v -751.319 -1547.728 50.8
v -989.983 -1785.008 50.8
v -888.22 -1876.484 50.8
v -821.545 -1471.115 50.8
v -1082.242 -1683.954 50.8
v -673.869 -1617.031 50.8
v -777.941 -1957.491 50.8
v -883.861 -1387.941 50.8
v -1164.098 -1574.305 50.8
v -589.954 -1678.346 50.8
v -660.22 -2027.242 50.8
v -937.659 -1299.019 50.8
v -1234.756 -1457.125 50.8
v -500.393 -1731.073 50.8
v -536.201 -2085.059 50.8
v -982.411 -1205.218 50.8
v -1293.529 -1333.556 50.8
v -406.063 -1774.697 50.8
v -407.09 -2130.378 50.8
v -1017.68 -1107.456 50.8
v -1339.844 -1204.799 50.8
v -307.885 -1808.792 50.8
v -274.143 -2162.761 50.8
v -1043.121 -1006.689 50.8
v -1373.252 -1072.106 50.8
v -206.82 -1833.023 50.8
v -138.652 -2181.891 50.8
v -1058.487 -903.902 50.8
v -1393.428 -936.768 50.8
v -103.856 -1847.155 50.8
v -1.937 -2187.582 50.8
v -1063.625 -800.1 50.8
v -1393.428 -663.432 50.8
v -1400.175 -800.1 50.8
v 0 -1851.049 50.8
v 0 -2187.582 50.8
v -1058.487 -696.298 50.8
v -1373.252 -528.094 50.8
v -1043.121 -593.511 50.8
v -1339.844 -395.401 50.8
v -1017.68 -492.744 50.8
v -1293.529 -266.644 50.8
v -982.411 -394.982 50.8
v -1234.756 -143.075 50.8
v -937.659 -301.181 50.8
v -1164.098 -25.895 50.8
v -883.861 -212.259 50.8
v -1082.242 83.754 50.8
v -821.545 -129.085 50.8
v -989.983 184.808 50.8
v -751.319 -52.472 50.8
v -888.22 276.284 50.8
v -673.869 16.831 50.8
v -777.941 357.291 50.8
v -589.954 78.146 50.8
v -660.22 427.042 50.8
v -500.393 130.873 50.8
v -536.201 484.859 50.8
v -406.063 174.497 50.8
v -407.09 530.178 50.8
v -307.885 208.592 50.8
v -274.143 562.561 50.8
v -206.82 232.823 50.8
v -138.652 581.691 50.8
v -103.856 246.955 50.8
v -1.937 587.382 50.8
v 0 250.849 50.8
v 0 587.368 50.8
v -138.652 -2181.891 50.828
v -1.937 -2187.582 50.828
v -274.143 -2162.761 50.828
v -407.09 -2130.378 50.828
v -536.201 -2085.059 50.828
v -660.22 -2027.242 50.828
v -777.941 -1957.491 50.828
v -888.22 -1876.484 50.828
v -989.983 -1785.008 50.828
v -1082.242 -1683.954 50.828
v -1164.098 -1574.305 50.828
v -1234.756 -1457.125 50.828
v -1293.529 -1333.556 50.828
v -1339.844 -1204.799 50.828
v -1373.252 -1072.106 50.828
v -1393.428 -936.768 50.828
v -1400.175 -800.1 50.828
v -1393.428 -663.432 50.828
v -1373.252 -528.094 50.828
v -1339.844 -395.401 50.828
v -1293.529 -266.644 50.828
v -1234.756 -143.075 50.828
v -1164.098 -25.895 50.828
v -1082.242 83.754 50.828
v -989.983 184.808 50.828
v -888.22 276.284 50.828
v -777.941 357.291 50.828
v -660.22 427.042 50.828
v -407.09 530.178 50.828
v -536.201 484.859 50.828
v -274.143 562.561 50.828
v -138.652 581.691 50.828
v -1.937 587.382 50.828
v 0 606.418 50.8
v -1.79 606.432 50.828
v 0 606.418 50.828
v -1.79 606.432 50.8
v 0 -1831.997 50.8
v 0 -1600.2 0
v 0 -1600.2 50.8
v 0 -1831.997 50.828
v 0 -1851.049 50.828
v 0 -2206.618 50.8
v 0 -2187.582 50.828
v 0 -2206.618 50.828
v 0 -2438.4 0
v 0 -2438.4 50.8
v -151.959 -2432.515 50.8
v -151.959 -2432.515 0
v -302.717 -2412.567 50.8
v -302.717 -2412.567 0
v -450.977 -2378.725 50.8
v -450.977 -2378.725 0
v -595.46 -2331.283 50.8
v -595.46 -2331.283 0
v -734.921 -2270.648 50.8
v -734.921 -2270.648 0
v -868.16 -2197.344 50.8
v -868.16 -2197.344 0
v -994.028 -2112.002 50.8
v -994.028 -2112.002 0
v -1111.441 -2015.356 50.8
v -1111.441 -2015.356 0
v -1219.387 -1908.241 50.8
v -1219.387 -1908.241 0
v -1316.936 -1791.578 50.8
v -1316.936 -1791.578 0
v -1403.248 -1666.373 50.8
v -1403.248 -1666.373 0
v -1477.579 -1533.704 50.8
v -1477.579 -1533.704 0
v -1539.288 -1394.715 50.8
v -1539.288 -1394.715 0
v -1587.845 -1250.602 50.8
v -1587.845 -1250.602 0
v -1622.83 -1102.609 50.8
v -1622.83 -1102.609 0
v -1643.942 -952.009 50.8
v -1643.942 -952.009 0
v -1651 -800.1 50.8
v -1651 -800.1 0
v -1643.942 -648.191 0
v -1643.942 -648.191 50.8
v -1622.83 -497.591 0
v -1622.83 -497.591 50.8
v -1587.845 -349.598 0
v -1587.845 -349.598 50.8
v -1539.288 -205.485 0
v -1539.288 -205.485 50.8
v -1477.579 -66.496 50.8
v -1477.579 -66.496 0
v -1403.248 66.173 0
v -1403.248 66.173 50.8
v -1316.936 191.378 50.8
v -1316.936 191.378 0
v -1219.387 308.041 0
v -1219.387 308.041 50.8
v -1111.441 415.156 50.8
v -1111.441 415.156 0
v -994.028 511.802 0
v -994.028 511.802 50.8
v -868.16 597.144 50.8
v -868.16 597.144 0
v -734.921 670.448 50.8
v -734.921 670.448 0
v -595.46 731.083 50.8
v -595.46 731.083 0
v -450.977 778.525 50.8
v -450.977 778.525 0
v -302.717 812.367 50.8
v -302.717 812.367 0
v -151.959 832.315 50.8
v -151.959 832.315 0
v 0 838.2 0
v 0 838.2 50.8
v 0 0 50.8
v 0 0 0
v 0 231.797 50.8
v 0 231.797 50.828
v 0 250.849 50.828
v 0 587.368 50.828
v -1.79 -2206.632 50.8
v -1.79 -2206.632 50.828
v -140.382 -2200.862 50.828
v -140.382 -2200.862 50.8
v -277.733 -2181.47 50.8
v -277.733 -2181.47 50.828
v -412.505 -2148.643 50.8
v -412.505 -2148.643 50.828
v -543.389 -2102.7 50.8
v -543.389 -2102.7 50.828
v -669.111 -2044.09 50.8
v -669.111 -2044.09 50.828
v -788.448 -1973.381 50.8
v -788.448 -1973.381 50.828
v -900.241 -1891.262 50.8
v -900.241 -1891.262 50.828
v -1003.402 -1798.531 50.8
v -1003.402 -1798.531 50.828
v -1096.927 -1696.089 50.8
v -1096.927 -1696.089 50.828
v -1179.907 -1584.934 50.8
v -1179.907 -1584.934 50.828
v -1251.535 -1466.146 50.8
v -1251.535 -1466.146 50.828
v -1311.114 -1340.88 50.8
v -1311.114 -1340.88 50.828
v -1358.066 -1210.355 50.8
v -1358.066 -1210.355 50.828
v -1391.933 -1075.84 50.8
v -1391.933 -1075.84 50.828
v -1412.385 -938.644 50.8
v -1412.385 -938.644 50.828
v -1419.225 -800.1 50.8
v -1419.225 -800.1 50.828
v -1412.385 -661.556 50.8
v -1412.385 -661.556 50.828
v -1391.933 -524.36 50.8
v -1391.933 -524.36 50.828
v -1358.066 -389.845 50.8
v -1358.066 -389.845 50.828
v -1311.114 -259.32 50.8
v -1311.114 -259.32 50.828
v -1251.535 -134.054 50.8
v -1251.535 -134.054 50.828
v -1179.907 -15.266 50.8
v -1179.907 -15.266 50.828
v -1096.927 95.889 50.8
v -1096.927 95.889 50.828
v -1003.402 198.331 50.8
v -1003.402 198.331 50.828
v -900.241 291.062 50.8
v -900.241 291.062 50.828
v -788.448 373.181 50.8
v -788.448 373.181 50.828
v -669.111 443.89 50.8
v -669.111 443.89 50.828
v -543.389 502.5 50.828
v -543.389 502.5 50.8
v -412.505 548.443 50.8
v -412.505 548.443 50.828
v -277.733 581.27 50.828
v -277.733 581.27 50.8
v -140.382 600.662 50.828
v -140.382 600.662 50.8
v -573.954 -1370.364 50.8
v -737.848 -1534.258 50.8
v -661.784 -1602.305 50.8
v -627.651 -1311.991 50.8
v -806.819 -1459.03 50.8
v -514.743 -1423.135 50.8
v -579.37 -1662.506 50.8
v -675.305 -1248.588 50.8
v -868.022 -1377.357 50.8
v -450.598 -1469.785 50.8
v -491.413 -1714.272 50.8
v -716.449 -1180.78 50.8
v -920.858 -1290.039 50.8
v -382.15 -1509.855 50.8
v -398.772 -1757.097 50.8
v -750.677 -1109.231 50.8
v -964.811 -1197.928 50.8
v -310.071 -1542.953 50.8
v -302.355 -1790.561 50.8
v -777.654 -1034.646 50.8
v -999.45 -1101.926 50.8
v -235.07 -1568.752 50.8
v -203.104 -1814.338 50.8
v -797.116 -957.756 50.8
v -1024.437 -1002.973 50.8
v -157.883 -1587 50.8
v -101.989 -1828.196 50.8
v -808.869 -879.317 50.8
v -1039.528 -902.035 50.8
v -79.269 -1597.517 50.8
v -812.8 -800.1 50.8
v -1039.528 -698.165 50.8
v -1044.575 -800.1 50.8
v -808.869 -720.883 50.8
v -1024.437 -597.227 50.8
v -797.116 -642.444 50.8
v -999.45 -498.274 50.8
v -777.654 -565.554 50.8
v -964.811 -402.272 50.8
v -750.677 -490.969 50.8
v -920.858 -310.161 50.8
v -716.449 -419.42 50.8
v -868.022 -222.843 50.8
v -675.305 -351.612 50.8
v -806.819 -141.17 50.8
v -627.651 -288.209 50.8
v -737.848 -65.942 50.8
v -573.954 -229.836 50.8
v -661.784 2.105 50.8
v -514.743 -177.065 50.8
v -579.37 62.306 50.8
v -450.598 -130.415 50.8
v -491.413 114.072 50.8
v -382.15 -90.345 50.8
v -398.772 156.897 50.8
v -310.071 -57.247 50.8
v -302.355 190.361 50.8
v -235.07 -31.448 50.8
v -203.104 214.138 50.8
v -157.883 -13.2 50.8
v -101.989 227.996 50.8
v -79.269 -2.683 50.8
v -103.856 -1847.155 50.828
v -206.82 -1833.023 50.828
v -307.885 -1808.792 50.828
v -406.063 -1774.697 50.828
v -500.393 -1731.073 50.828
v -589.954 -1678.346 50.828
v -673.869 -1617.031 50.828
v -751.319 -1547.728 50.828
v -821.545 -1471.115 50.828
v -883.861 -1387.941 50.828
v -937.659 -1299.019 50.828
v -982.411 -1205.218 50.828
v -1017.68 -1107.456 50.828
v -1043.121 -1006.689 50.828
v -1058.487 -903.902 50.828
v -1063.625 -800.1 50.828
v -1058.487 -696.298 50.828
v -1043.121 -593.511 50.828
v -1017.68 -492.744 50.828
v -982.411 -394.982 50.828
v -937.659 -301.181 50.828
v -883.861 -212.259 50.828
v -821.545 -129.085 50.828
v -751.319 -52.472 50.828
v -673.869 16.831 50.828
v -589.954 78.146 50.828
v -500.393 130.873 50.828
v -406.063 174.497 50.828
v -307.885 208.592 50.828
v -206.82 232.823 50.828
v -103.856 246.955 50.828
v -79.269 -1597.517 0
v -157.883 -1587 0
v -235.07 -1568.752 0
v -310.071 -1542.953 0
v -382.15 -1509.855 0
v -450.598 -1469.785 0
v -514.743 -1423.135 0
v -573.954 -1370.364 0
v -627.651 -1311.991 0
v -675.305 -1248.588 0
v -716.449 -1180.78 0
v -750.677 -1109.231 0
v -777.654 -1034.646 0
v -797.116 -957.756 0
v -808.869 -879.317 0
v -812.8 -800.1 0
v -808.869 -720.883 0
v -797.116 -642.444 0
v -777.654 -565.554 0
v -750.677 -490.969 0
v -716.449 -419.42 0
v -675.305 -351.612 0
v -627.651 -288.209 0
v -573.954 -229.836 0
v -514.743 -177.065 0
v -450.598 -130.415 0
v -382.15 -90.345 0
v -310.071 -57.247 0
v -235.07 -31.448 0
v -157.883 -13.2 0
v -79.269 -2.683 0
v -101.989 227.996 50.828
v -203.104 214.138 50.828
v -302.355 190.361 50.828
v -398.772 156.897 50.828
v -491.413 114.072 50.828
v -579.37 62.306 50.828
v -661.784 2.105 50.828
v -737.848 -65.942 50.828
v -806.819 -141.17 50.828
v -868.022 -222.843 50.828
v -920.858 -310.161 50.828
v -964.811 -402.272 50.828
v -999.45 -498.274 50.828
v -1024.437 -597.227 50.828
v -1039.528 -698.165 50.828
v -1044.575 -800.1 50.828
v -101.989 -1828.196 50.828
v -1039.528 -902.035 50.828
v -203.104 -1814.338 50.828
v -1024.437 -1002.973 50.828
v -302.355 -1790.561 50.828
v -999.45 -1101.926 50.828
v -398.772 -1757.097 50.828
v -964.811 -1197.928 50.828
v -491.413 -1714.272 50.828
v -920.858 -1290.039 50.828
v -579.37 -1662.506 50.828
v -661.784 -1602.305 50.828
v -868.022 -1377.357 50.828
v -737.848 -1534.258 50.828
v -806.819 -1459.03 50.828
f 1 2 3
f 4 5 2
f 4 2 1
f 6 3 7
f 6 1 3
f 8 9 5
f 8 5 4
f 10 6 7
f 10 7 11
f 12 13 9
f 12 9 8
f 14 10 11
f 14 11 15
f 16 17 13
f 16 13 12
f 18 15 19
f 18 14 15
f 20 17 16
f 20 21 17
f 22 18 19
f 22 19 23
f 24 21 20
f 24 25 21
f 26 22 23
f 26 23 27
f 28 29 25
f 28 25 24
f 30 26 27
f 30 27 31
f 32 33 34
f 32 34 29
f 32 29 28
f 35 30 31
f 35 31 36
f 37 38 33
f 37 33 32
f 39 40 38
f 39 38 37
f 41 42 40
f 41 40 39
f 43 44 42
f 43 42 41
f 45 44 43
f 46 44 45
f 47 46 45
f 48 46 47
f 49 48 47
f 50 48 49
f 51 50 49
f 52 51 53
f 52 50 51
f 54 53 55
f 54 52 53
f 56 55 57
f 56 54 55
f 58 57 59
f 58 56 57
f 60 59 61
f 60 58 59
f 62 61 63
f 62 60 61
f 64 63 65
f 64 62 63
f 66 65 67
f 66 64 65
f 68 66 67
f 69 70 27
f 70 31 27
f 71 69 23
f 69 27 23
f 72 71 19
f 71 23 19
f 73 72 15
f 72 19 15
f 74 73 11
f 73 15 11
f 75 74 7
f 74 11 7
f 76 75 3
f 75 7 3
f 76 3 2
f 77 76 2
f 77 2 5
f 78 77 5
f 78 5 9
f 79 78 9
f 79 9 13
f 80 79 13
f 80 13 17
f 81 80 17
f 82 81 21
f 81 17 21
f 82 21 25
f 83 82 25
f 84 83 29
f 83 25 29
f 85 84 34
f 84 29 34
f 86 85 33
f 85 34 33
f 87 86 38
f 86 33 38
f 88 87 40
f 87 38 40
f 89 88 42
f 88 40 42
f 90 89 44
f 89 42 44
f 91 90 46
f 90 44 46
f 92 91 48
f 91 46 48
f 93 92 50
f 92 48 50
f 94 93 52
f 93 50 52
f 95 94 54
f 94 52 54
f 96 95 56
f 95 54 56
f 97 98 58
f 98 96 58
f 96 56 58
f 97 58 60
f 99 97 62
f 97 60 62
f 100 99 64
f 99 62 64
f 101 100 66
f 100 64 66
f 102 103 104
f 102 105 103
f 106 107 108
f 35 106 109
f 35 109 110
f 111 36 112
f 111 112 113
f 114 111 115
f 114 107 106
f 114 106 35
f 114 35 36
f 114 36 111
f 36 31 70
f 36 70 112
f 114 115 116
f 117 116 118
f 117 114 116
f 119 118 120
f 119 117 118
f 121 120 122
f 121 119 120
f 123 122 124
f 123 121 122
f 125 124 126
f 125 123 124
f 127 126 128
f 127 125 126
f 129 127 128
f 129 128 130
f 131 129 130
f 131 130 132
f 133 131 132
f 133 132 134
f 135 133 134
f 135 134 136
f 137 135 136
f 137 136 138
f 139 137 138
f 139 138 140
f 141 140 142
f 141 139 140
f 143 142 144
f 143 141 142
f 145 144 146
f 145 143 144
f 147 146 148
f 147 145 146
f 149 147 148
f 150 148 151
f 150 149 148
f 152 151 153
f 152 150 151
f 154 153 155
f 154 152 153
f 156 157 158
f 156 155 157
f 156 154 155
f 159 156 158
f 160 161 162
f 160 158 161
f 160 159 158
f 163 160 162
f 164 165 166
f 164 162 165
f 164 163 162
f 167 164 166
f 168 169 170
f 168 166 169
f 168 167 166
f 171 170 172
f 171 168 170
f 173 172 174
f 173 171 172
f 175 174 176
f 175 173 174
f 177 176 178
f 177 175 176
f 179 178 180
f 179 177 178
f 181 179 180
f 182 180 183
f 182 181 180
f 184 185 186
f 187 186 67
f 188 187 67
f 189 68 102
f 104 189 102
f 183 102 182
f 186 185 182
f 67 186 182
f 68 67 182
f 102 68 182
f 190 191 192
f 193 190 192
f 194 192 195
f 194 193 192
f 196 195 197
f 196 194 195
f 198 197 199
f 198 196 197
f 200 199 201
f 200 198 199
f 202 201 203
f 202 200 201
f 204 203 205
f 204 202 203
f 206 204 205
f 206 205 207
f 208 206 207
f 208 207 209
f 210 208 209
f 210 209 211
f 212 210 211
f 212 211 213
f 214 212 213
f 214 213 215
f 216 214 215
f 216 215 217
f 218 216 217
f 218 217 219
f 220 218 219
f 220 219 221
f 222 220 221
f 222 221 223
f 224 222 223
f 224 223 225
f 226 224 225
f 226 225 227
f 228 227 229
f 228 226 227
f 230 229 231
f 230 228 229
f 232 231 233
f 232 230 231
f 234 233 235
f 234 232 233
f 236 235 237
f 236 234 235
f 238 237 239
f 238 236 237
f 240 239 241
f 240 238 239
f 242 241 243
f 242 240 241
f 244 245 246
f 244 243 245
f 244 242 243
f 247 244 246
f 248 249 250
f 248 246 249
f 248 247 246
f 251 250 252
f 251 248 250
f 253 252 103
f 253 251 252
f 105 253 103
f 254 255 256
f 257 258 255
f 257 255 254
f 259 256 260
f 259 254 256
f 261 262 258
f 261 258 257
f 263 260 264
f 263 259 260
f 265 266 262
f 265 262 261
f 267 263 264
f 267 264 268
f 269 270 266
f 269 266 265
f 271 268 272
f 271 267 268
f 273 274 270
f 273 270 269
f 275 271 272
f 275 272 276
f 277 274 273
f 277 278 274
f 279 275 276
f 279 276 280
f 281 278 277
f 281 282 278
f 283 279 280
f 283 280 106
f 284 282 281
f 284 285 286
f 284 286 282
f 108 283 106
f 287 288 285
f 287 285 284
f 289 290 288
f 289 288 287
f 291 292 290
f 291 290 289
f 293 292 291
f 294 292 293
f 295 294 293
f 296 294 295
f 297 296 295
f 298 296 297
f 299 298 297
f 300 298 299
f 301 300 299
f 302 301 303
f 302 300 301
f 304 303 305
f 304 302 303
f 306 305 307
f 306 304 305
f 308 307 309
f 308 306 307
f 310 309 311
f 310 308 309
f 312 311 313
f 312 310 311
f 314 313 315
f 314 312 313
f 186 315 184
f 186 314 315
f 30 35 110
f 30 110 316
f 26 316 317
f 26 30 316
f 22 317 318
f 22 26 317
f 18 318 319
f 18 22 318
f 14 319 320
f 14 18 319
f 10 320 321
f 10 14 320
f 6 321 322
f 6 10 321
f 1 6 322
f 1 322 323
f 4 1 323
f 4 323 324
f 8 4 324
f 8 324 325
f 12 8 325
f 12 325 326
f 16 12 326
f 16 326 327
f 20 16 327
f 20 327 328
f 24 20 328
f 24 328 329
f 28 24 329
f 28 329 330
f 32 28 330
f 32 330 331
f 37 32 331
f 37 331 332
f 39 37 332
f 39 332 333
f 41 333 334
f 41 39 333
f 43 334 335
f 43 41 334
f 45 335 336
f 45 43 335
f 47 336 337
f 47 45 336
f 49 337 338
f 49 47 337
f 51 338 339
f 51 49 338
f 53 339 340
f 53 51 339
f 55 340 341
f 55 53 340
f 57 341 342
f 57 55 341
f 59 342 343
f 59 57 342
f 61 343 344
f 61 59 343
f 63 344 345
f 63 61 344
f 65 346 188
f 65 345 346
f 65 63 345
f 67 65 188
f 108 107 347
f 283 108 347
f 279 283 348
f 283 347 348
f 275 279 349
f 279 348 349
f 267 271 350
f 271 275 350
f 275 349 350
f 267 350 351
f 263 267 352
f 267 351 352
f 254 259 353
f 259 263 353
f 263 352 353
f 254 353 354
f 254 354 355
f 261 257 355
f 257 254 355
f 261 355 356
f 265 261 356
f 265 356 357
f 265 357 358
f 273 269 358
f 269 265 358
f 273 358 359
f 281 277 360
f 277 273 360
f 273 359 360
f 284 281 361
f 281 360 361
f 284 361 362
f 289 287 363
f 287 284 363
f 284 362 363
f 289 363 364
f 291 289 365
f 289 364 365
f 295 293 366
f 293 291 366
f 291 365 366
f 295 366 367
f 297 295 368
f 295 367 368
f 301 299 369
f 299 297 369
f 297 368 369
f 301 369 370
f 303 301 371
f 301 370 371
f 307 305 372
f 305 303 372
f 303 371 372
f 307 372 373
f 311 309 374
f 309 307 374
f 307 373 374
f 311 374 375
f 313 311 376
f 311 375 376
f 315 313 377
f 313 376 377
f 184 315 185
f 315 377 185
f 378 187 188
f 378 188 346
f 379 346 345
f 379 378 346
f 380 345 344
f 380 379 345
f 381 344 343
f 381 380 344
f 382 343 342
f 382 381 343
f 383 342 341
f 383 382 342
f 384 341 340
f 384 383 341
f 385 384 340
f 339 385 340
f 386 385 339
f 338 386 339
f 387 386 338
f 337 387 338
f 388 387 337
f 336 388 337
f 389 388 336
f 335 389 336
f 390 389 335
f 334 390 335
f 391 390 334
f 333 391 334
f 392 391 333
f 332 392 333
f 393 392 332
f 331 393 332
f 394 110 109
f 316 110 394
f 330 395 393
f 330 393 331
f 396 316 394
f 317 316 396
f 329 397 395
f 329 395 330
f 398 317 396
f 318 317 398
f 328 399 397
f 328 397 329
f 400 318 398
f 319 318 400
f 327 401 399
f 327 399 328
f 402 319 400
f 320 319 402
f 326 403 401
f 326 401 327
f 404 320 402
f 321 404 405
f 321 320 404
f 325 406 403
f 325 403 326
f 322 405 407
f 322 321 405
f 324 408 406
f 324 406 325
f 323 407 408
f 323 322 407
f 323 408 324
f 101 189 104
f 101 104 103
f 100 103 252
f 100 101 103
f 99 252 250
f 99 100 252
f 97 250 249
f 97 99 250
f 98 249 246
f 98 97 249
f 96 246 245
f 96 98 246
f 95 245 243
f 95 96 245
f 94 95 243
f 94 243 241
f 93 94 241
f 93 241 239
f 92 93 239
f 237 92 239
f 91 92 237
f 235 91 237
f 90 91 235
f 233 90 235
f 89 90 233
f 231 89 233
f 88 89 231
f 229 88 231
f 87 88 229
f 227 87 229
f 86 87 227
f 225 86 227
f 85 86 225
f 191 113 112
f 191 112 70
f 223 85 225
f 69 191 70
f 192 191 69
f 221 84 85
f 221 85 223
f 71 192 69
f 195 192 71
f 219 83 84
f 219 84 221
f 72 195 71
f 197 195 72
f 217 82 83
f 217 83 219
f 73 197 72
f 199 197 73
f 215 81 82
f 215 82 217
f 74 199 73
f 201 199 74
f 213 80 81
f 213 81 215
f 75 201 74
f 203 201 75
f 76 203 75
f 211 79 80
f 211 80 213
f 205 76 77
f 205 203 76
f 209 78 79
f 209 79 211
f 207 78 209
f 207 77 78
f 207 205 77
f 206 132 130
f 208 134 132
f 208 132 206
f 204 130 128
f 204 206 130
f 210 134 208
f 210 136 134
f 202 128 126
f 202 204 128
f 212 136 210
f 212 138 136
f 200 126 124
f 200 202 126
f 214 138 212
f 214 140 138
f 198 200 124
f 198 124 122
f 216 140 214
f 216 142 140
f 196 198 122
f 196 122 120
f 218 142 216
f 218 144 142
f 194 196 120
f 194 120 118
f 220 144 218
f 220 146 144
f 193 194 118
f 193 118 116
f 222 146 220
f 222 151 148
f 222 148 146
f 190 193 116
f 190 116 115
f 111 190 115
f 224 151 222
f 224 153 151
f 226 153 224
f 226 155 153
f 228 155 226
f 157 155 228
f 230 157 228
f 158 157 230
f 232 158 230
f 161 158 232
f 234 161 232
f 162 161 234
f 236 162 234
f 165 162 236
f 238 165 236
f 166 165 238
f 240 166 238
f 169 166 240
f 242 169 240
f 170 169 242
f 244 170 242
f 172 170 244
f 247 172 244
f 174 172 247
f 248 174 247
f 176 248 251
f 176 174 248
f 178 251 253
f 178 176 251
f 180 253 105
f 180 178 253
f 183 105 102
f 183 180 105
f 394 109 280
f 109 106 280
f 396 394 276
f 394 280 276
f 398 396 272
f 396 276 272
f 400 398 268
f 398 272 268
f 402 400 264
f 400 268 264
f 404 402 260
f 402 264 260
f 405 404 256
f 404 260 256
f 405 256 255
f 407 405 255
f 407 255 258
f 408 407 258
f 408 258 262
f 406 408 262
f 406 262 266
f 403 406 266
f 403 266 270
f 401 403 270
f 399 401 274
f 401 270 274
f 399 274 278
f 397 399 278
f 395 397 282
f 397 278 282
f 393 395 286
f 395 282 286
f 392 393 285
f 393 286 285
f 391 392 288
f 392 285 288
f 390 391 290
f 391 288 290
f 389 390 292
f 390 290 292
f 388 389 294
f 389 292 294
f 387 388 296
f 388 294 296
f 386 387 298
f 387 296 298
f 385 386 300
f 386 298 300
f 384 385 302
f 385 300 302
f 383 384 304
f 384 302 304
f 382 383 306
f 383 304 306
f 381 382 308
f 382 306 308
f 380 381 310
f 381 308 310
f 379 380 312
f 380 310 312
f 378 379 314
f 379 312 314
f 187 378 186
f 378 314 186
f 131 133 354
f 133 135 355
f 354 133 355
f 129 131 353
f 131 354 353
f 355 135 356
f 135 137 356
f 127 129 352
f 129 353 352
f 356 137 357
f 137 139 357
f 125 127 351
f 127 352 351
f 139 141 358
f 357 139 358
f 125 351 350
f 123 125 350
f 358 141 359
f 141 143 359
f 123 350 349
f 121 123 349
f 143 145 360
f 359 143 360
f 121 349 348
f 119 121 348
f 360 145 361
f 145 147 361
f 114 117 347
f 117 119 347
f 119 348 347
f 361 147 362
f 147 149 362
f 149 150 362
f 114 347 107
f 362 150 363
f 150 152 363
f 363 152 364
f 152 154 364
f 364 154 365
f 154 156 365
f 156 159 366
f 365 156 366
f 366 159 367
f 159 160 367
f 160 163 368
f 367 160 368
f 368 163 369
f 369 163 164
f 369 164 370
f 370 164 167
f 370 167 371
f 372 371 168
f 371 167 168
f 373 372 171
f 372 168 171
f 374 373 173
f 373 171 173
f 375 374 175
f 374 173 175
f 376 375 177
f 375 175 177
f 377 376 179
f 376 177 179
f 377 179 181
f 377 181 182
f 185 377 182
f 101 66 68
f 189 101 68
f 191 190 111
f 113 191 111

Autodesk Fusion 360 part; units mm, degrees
sketch "Sketch1" plane through (0, 0, 0) normal (0, 0, 1) x (1, 0, 0)
  line L0 (0, 0) -> (0, -1600.2)
  line L1 (0, -800.1) -> (-812.8, -800.1)
  line L2 (0, -800.1) -> (-1651, -800.1)
  line L3 (0, -1600.2) -> (0, -2438.4)
  line L4 (0, -2438.4) -> (0, -1600.2)
  line L5 (0, 0) -> (0, 838.2)
  circle A0 centre (-12.6008, -800.1) radius 800.1992
  circle A1 centre (-12.6512, -800.1) radius 1638.3488
  dimension "d5" = 838.2
  dimension "d6" = 838.2
extrude "Extrude1" add sketch "Sketch1" along normal blind 50.8 contours L2 L5 A0 A1 | L2 L3 L4 A0 A1
sketch "Sketch2" plane through (0, 0, 50.8) normal (0, 0, 1) x (-1, 0, 0)
  line L0 (0, 0) -> (0, -838.2)
  arc A0 (0, -838.2) -> (0, 2438.4) centre (12.6512, 800.1) ccw
  line L1 (0, 2438.4) -> (0, 1600.2)
  arc A1 (0, 0) -> (0, 1600.2) centre (12.6008, 800.1) ccw
  arc A2 (-3.9498, -250.7939) -> (-3.9498, 1850.9939) centre (12.6008, 800.1) ccw
  arc A3 (-3.6498, -231.7463) -> (-3.6498, 1831.9463) centre (12.6008, 800.1) ccw
  arc A4 (1.9368, -587.3825) -> (1.9368, 2187.5825) centre (12.6512, 800.1) ccw
  arc A5 (1.7897, -606.4319) -> (1.7897, 2206.6319) centre (12.6512, 800.1) ccw
  line L2 (1.9368, 2187.5825) -> (0, 2187.5675)
  line L3 (1.7897, 2206.6319) -> (0, 2206.6181)
  line L4 (1.9368, -587.3825) -> (0, -587.3675)
  line L5 (1.7897, -606.4319) -> (0, -606.4181)
extrude "Extrude2" add sketch "Sketch2" along normal blind 0.0279 contours L0 L1 A2 A3
sketch "Sketch3" plane through (0, 0, 50.8) normal (0, 0, 1) x (-1, 0, 0)
  arc A0 (0, -250.8487) -> (0, 1851.0487) centre (12.6008, 800.1) ccw
  line L0 (0, -250.8487) -> (0, -838.2)
  arc A1 (0, -838.2) -> (0, 2438.4) centre (12.6512, 800.1) ccw
  line L1 (0, 2438.4) -> (0, 1851.0487)
  arc A2 (1.9368, -587.3825) -> (1.9368, 2187.5825) centre (12.6512, 800.1) ccw
  arc A3 (1.7897, -606.4319) -> (1.7897, 2206.6319) centre (12.6512, 800.1) ccw
  line L2 (1.7897, -606.4319) -> (0, -606.4181)
  line L3 (1.9368, -587.3825) -> (0, -587.3675)
  line L4 (1.9368, 2187.5825) -> (0, 2187.5825)
  line L5 (1.7897, 2206.6319) -> (0, 2206.6181)
extrude "Extrude3" add sketch "Sketch3" along normal blind 0.0279 contours L0 L1 A2 A3 L2 L3 L4 L5
